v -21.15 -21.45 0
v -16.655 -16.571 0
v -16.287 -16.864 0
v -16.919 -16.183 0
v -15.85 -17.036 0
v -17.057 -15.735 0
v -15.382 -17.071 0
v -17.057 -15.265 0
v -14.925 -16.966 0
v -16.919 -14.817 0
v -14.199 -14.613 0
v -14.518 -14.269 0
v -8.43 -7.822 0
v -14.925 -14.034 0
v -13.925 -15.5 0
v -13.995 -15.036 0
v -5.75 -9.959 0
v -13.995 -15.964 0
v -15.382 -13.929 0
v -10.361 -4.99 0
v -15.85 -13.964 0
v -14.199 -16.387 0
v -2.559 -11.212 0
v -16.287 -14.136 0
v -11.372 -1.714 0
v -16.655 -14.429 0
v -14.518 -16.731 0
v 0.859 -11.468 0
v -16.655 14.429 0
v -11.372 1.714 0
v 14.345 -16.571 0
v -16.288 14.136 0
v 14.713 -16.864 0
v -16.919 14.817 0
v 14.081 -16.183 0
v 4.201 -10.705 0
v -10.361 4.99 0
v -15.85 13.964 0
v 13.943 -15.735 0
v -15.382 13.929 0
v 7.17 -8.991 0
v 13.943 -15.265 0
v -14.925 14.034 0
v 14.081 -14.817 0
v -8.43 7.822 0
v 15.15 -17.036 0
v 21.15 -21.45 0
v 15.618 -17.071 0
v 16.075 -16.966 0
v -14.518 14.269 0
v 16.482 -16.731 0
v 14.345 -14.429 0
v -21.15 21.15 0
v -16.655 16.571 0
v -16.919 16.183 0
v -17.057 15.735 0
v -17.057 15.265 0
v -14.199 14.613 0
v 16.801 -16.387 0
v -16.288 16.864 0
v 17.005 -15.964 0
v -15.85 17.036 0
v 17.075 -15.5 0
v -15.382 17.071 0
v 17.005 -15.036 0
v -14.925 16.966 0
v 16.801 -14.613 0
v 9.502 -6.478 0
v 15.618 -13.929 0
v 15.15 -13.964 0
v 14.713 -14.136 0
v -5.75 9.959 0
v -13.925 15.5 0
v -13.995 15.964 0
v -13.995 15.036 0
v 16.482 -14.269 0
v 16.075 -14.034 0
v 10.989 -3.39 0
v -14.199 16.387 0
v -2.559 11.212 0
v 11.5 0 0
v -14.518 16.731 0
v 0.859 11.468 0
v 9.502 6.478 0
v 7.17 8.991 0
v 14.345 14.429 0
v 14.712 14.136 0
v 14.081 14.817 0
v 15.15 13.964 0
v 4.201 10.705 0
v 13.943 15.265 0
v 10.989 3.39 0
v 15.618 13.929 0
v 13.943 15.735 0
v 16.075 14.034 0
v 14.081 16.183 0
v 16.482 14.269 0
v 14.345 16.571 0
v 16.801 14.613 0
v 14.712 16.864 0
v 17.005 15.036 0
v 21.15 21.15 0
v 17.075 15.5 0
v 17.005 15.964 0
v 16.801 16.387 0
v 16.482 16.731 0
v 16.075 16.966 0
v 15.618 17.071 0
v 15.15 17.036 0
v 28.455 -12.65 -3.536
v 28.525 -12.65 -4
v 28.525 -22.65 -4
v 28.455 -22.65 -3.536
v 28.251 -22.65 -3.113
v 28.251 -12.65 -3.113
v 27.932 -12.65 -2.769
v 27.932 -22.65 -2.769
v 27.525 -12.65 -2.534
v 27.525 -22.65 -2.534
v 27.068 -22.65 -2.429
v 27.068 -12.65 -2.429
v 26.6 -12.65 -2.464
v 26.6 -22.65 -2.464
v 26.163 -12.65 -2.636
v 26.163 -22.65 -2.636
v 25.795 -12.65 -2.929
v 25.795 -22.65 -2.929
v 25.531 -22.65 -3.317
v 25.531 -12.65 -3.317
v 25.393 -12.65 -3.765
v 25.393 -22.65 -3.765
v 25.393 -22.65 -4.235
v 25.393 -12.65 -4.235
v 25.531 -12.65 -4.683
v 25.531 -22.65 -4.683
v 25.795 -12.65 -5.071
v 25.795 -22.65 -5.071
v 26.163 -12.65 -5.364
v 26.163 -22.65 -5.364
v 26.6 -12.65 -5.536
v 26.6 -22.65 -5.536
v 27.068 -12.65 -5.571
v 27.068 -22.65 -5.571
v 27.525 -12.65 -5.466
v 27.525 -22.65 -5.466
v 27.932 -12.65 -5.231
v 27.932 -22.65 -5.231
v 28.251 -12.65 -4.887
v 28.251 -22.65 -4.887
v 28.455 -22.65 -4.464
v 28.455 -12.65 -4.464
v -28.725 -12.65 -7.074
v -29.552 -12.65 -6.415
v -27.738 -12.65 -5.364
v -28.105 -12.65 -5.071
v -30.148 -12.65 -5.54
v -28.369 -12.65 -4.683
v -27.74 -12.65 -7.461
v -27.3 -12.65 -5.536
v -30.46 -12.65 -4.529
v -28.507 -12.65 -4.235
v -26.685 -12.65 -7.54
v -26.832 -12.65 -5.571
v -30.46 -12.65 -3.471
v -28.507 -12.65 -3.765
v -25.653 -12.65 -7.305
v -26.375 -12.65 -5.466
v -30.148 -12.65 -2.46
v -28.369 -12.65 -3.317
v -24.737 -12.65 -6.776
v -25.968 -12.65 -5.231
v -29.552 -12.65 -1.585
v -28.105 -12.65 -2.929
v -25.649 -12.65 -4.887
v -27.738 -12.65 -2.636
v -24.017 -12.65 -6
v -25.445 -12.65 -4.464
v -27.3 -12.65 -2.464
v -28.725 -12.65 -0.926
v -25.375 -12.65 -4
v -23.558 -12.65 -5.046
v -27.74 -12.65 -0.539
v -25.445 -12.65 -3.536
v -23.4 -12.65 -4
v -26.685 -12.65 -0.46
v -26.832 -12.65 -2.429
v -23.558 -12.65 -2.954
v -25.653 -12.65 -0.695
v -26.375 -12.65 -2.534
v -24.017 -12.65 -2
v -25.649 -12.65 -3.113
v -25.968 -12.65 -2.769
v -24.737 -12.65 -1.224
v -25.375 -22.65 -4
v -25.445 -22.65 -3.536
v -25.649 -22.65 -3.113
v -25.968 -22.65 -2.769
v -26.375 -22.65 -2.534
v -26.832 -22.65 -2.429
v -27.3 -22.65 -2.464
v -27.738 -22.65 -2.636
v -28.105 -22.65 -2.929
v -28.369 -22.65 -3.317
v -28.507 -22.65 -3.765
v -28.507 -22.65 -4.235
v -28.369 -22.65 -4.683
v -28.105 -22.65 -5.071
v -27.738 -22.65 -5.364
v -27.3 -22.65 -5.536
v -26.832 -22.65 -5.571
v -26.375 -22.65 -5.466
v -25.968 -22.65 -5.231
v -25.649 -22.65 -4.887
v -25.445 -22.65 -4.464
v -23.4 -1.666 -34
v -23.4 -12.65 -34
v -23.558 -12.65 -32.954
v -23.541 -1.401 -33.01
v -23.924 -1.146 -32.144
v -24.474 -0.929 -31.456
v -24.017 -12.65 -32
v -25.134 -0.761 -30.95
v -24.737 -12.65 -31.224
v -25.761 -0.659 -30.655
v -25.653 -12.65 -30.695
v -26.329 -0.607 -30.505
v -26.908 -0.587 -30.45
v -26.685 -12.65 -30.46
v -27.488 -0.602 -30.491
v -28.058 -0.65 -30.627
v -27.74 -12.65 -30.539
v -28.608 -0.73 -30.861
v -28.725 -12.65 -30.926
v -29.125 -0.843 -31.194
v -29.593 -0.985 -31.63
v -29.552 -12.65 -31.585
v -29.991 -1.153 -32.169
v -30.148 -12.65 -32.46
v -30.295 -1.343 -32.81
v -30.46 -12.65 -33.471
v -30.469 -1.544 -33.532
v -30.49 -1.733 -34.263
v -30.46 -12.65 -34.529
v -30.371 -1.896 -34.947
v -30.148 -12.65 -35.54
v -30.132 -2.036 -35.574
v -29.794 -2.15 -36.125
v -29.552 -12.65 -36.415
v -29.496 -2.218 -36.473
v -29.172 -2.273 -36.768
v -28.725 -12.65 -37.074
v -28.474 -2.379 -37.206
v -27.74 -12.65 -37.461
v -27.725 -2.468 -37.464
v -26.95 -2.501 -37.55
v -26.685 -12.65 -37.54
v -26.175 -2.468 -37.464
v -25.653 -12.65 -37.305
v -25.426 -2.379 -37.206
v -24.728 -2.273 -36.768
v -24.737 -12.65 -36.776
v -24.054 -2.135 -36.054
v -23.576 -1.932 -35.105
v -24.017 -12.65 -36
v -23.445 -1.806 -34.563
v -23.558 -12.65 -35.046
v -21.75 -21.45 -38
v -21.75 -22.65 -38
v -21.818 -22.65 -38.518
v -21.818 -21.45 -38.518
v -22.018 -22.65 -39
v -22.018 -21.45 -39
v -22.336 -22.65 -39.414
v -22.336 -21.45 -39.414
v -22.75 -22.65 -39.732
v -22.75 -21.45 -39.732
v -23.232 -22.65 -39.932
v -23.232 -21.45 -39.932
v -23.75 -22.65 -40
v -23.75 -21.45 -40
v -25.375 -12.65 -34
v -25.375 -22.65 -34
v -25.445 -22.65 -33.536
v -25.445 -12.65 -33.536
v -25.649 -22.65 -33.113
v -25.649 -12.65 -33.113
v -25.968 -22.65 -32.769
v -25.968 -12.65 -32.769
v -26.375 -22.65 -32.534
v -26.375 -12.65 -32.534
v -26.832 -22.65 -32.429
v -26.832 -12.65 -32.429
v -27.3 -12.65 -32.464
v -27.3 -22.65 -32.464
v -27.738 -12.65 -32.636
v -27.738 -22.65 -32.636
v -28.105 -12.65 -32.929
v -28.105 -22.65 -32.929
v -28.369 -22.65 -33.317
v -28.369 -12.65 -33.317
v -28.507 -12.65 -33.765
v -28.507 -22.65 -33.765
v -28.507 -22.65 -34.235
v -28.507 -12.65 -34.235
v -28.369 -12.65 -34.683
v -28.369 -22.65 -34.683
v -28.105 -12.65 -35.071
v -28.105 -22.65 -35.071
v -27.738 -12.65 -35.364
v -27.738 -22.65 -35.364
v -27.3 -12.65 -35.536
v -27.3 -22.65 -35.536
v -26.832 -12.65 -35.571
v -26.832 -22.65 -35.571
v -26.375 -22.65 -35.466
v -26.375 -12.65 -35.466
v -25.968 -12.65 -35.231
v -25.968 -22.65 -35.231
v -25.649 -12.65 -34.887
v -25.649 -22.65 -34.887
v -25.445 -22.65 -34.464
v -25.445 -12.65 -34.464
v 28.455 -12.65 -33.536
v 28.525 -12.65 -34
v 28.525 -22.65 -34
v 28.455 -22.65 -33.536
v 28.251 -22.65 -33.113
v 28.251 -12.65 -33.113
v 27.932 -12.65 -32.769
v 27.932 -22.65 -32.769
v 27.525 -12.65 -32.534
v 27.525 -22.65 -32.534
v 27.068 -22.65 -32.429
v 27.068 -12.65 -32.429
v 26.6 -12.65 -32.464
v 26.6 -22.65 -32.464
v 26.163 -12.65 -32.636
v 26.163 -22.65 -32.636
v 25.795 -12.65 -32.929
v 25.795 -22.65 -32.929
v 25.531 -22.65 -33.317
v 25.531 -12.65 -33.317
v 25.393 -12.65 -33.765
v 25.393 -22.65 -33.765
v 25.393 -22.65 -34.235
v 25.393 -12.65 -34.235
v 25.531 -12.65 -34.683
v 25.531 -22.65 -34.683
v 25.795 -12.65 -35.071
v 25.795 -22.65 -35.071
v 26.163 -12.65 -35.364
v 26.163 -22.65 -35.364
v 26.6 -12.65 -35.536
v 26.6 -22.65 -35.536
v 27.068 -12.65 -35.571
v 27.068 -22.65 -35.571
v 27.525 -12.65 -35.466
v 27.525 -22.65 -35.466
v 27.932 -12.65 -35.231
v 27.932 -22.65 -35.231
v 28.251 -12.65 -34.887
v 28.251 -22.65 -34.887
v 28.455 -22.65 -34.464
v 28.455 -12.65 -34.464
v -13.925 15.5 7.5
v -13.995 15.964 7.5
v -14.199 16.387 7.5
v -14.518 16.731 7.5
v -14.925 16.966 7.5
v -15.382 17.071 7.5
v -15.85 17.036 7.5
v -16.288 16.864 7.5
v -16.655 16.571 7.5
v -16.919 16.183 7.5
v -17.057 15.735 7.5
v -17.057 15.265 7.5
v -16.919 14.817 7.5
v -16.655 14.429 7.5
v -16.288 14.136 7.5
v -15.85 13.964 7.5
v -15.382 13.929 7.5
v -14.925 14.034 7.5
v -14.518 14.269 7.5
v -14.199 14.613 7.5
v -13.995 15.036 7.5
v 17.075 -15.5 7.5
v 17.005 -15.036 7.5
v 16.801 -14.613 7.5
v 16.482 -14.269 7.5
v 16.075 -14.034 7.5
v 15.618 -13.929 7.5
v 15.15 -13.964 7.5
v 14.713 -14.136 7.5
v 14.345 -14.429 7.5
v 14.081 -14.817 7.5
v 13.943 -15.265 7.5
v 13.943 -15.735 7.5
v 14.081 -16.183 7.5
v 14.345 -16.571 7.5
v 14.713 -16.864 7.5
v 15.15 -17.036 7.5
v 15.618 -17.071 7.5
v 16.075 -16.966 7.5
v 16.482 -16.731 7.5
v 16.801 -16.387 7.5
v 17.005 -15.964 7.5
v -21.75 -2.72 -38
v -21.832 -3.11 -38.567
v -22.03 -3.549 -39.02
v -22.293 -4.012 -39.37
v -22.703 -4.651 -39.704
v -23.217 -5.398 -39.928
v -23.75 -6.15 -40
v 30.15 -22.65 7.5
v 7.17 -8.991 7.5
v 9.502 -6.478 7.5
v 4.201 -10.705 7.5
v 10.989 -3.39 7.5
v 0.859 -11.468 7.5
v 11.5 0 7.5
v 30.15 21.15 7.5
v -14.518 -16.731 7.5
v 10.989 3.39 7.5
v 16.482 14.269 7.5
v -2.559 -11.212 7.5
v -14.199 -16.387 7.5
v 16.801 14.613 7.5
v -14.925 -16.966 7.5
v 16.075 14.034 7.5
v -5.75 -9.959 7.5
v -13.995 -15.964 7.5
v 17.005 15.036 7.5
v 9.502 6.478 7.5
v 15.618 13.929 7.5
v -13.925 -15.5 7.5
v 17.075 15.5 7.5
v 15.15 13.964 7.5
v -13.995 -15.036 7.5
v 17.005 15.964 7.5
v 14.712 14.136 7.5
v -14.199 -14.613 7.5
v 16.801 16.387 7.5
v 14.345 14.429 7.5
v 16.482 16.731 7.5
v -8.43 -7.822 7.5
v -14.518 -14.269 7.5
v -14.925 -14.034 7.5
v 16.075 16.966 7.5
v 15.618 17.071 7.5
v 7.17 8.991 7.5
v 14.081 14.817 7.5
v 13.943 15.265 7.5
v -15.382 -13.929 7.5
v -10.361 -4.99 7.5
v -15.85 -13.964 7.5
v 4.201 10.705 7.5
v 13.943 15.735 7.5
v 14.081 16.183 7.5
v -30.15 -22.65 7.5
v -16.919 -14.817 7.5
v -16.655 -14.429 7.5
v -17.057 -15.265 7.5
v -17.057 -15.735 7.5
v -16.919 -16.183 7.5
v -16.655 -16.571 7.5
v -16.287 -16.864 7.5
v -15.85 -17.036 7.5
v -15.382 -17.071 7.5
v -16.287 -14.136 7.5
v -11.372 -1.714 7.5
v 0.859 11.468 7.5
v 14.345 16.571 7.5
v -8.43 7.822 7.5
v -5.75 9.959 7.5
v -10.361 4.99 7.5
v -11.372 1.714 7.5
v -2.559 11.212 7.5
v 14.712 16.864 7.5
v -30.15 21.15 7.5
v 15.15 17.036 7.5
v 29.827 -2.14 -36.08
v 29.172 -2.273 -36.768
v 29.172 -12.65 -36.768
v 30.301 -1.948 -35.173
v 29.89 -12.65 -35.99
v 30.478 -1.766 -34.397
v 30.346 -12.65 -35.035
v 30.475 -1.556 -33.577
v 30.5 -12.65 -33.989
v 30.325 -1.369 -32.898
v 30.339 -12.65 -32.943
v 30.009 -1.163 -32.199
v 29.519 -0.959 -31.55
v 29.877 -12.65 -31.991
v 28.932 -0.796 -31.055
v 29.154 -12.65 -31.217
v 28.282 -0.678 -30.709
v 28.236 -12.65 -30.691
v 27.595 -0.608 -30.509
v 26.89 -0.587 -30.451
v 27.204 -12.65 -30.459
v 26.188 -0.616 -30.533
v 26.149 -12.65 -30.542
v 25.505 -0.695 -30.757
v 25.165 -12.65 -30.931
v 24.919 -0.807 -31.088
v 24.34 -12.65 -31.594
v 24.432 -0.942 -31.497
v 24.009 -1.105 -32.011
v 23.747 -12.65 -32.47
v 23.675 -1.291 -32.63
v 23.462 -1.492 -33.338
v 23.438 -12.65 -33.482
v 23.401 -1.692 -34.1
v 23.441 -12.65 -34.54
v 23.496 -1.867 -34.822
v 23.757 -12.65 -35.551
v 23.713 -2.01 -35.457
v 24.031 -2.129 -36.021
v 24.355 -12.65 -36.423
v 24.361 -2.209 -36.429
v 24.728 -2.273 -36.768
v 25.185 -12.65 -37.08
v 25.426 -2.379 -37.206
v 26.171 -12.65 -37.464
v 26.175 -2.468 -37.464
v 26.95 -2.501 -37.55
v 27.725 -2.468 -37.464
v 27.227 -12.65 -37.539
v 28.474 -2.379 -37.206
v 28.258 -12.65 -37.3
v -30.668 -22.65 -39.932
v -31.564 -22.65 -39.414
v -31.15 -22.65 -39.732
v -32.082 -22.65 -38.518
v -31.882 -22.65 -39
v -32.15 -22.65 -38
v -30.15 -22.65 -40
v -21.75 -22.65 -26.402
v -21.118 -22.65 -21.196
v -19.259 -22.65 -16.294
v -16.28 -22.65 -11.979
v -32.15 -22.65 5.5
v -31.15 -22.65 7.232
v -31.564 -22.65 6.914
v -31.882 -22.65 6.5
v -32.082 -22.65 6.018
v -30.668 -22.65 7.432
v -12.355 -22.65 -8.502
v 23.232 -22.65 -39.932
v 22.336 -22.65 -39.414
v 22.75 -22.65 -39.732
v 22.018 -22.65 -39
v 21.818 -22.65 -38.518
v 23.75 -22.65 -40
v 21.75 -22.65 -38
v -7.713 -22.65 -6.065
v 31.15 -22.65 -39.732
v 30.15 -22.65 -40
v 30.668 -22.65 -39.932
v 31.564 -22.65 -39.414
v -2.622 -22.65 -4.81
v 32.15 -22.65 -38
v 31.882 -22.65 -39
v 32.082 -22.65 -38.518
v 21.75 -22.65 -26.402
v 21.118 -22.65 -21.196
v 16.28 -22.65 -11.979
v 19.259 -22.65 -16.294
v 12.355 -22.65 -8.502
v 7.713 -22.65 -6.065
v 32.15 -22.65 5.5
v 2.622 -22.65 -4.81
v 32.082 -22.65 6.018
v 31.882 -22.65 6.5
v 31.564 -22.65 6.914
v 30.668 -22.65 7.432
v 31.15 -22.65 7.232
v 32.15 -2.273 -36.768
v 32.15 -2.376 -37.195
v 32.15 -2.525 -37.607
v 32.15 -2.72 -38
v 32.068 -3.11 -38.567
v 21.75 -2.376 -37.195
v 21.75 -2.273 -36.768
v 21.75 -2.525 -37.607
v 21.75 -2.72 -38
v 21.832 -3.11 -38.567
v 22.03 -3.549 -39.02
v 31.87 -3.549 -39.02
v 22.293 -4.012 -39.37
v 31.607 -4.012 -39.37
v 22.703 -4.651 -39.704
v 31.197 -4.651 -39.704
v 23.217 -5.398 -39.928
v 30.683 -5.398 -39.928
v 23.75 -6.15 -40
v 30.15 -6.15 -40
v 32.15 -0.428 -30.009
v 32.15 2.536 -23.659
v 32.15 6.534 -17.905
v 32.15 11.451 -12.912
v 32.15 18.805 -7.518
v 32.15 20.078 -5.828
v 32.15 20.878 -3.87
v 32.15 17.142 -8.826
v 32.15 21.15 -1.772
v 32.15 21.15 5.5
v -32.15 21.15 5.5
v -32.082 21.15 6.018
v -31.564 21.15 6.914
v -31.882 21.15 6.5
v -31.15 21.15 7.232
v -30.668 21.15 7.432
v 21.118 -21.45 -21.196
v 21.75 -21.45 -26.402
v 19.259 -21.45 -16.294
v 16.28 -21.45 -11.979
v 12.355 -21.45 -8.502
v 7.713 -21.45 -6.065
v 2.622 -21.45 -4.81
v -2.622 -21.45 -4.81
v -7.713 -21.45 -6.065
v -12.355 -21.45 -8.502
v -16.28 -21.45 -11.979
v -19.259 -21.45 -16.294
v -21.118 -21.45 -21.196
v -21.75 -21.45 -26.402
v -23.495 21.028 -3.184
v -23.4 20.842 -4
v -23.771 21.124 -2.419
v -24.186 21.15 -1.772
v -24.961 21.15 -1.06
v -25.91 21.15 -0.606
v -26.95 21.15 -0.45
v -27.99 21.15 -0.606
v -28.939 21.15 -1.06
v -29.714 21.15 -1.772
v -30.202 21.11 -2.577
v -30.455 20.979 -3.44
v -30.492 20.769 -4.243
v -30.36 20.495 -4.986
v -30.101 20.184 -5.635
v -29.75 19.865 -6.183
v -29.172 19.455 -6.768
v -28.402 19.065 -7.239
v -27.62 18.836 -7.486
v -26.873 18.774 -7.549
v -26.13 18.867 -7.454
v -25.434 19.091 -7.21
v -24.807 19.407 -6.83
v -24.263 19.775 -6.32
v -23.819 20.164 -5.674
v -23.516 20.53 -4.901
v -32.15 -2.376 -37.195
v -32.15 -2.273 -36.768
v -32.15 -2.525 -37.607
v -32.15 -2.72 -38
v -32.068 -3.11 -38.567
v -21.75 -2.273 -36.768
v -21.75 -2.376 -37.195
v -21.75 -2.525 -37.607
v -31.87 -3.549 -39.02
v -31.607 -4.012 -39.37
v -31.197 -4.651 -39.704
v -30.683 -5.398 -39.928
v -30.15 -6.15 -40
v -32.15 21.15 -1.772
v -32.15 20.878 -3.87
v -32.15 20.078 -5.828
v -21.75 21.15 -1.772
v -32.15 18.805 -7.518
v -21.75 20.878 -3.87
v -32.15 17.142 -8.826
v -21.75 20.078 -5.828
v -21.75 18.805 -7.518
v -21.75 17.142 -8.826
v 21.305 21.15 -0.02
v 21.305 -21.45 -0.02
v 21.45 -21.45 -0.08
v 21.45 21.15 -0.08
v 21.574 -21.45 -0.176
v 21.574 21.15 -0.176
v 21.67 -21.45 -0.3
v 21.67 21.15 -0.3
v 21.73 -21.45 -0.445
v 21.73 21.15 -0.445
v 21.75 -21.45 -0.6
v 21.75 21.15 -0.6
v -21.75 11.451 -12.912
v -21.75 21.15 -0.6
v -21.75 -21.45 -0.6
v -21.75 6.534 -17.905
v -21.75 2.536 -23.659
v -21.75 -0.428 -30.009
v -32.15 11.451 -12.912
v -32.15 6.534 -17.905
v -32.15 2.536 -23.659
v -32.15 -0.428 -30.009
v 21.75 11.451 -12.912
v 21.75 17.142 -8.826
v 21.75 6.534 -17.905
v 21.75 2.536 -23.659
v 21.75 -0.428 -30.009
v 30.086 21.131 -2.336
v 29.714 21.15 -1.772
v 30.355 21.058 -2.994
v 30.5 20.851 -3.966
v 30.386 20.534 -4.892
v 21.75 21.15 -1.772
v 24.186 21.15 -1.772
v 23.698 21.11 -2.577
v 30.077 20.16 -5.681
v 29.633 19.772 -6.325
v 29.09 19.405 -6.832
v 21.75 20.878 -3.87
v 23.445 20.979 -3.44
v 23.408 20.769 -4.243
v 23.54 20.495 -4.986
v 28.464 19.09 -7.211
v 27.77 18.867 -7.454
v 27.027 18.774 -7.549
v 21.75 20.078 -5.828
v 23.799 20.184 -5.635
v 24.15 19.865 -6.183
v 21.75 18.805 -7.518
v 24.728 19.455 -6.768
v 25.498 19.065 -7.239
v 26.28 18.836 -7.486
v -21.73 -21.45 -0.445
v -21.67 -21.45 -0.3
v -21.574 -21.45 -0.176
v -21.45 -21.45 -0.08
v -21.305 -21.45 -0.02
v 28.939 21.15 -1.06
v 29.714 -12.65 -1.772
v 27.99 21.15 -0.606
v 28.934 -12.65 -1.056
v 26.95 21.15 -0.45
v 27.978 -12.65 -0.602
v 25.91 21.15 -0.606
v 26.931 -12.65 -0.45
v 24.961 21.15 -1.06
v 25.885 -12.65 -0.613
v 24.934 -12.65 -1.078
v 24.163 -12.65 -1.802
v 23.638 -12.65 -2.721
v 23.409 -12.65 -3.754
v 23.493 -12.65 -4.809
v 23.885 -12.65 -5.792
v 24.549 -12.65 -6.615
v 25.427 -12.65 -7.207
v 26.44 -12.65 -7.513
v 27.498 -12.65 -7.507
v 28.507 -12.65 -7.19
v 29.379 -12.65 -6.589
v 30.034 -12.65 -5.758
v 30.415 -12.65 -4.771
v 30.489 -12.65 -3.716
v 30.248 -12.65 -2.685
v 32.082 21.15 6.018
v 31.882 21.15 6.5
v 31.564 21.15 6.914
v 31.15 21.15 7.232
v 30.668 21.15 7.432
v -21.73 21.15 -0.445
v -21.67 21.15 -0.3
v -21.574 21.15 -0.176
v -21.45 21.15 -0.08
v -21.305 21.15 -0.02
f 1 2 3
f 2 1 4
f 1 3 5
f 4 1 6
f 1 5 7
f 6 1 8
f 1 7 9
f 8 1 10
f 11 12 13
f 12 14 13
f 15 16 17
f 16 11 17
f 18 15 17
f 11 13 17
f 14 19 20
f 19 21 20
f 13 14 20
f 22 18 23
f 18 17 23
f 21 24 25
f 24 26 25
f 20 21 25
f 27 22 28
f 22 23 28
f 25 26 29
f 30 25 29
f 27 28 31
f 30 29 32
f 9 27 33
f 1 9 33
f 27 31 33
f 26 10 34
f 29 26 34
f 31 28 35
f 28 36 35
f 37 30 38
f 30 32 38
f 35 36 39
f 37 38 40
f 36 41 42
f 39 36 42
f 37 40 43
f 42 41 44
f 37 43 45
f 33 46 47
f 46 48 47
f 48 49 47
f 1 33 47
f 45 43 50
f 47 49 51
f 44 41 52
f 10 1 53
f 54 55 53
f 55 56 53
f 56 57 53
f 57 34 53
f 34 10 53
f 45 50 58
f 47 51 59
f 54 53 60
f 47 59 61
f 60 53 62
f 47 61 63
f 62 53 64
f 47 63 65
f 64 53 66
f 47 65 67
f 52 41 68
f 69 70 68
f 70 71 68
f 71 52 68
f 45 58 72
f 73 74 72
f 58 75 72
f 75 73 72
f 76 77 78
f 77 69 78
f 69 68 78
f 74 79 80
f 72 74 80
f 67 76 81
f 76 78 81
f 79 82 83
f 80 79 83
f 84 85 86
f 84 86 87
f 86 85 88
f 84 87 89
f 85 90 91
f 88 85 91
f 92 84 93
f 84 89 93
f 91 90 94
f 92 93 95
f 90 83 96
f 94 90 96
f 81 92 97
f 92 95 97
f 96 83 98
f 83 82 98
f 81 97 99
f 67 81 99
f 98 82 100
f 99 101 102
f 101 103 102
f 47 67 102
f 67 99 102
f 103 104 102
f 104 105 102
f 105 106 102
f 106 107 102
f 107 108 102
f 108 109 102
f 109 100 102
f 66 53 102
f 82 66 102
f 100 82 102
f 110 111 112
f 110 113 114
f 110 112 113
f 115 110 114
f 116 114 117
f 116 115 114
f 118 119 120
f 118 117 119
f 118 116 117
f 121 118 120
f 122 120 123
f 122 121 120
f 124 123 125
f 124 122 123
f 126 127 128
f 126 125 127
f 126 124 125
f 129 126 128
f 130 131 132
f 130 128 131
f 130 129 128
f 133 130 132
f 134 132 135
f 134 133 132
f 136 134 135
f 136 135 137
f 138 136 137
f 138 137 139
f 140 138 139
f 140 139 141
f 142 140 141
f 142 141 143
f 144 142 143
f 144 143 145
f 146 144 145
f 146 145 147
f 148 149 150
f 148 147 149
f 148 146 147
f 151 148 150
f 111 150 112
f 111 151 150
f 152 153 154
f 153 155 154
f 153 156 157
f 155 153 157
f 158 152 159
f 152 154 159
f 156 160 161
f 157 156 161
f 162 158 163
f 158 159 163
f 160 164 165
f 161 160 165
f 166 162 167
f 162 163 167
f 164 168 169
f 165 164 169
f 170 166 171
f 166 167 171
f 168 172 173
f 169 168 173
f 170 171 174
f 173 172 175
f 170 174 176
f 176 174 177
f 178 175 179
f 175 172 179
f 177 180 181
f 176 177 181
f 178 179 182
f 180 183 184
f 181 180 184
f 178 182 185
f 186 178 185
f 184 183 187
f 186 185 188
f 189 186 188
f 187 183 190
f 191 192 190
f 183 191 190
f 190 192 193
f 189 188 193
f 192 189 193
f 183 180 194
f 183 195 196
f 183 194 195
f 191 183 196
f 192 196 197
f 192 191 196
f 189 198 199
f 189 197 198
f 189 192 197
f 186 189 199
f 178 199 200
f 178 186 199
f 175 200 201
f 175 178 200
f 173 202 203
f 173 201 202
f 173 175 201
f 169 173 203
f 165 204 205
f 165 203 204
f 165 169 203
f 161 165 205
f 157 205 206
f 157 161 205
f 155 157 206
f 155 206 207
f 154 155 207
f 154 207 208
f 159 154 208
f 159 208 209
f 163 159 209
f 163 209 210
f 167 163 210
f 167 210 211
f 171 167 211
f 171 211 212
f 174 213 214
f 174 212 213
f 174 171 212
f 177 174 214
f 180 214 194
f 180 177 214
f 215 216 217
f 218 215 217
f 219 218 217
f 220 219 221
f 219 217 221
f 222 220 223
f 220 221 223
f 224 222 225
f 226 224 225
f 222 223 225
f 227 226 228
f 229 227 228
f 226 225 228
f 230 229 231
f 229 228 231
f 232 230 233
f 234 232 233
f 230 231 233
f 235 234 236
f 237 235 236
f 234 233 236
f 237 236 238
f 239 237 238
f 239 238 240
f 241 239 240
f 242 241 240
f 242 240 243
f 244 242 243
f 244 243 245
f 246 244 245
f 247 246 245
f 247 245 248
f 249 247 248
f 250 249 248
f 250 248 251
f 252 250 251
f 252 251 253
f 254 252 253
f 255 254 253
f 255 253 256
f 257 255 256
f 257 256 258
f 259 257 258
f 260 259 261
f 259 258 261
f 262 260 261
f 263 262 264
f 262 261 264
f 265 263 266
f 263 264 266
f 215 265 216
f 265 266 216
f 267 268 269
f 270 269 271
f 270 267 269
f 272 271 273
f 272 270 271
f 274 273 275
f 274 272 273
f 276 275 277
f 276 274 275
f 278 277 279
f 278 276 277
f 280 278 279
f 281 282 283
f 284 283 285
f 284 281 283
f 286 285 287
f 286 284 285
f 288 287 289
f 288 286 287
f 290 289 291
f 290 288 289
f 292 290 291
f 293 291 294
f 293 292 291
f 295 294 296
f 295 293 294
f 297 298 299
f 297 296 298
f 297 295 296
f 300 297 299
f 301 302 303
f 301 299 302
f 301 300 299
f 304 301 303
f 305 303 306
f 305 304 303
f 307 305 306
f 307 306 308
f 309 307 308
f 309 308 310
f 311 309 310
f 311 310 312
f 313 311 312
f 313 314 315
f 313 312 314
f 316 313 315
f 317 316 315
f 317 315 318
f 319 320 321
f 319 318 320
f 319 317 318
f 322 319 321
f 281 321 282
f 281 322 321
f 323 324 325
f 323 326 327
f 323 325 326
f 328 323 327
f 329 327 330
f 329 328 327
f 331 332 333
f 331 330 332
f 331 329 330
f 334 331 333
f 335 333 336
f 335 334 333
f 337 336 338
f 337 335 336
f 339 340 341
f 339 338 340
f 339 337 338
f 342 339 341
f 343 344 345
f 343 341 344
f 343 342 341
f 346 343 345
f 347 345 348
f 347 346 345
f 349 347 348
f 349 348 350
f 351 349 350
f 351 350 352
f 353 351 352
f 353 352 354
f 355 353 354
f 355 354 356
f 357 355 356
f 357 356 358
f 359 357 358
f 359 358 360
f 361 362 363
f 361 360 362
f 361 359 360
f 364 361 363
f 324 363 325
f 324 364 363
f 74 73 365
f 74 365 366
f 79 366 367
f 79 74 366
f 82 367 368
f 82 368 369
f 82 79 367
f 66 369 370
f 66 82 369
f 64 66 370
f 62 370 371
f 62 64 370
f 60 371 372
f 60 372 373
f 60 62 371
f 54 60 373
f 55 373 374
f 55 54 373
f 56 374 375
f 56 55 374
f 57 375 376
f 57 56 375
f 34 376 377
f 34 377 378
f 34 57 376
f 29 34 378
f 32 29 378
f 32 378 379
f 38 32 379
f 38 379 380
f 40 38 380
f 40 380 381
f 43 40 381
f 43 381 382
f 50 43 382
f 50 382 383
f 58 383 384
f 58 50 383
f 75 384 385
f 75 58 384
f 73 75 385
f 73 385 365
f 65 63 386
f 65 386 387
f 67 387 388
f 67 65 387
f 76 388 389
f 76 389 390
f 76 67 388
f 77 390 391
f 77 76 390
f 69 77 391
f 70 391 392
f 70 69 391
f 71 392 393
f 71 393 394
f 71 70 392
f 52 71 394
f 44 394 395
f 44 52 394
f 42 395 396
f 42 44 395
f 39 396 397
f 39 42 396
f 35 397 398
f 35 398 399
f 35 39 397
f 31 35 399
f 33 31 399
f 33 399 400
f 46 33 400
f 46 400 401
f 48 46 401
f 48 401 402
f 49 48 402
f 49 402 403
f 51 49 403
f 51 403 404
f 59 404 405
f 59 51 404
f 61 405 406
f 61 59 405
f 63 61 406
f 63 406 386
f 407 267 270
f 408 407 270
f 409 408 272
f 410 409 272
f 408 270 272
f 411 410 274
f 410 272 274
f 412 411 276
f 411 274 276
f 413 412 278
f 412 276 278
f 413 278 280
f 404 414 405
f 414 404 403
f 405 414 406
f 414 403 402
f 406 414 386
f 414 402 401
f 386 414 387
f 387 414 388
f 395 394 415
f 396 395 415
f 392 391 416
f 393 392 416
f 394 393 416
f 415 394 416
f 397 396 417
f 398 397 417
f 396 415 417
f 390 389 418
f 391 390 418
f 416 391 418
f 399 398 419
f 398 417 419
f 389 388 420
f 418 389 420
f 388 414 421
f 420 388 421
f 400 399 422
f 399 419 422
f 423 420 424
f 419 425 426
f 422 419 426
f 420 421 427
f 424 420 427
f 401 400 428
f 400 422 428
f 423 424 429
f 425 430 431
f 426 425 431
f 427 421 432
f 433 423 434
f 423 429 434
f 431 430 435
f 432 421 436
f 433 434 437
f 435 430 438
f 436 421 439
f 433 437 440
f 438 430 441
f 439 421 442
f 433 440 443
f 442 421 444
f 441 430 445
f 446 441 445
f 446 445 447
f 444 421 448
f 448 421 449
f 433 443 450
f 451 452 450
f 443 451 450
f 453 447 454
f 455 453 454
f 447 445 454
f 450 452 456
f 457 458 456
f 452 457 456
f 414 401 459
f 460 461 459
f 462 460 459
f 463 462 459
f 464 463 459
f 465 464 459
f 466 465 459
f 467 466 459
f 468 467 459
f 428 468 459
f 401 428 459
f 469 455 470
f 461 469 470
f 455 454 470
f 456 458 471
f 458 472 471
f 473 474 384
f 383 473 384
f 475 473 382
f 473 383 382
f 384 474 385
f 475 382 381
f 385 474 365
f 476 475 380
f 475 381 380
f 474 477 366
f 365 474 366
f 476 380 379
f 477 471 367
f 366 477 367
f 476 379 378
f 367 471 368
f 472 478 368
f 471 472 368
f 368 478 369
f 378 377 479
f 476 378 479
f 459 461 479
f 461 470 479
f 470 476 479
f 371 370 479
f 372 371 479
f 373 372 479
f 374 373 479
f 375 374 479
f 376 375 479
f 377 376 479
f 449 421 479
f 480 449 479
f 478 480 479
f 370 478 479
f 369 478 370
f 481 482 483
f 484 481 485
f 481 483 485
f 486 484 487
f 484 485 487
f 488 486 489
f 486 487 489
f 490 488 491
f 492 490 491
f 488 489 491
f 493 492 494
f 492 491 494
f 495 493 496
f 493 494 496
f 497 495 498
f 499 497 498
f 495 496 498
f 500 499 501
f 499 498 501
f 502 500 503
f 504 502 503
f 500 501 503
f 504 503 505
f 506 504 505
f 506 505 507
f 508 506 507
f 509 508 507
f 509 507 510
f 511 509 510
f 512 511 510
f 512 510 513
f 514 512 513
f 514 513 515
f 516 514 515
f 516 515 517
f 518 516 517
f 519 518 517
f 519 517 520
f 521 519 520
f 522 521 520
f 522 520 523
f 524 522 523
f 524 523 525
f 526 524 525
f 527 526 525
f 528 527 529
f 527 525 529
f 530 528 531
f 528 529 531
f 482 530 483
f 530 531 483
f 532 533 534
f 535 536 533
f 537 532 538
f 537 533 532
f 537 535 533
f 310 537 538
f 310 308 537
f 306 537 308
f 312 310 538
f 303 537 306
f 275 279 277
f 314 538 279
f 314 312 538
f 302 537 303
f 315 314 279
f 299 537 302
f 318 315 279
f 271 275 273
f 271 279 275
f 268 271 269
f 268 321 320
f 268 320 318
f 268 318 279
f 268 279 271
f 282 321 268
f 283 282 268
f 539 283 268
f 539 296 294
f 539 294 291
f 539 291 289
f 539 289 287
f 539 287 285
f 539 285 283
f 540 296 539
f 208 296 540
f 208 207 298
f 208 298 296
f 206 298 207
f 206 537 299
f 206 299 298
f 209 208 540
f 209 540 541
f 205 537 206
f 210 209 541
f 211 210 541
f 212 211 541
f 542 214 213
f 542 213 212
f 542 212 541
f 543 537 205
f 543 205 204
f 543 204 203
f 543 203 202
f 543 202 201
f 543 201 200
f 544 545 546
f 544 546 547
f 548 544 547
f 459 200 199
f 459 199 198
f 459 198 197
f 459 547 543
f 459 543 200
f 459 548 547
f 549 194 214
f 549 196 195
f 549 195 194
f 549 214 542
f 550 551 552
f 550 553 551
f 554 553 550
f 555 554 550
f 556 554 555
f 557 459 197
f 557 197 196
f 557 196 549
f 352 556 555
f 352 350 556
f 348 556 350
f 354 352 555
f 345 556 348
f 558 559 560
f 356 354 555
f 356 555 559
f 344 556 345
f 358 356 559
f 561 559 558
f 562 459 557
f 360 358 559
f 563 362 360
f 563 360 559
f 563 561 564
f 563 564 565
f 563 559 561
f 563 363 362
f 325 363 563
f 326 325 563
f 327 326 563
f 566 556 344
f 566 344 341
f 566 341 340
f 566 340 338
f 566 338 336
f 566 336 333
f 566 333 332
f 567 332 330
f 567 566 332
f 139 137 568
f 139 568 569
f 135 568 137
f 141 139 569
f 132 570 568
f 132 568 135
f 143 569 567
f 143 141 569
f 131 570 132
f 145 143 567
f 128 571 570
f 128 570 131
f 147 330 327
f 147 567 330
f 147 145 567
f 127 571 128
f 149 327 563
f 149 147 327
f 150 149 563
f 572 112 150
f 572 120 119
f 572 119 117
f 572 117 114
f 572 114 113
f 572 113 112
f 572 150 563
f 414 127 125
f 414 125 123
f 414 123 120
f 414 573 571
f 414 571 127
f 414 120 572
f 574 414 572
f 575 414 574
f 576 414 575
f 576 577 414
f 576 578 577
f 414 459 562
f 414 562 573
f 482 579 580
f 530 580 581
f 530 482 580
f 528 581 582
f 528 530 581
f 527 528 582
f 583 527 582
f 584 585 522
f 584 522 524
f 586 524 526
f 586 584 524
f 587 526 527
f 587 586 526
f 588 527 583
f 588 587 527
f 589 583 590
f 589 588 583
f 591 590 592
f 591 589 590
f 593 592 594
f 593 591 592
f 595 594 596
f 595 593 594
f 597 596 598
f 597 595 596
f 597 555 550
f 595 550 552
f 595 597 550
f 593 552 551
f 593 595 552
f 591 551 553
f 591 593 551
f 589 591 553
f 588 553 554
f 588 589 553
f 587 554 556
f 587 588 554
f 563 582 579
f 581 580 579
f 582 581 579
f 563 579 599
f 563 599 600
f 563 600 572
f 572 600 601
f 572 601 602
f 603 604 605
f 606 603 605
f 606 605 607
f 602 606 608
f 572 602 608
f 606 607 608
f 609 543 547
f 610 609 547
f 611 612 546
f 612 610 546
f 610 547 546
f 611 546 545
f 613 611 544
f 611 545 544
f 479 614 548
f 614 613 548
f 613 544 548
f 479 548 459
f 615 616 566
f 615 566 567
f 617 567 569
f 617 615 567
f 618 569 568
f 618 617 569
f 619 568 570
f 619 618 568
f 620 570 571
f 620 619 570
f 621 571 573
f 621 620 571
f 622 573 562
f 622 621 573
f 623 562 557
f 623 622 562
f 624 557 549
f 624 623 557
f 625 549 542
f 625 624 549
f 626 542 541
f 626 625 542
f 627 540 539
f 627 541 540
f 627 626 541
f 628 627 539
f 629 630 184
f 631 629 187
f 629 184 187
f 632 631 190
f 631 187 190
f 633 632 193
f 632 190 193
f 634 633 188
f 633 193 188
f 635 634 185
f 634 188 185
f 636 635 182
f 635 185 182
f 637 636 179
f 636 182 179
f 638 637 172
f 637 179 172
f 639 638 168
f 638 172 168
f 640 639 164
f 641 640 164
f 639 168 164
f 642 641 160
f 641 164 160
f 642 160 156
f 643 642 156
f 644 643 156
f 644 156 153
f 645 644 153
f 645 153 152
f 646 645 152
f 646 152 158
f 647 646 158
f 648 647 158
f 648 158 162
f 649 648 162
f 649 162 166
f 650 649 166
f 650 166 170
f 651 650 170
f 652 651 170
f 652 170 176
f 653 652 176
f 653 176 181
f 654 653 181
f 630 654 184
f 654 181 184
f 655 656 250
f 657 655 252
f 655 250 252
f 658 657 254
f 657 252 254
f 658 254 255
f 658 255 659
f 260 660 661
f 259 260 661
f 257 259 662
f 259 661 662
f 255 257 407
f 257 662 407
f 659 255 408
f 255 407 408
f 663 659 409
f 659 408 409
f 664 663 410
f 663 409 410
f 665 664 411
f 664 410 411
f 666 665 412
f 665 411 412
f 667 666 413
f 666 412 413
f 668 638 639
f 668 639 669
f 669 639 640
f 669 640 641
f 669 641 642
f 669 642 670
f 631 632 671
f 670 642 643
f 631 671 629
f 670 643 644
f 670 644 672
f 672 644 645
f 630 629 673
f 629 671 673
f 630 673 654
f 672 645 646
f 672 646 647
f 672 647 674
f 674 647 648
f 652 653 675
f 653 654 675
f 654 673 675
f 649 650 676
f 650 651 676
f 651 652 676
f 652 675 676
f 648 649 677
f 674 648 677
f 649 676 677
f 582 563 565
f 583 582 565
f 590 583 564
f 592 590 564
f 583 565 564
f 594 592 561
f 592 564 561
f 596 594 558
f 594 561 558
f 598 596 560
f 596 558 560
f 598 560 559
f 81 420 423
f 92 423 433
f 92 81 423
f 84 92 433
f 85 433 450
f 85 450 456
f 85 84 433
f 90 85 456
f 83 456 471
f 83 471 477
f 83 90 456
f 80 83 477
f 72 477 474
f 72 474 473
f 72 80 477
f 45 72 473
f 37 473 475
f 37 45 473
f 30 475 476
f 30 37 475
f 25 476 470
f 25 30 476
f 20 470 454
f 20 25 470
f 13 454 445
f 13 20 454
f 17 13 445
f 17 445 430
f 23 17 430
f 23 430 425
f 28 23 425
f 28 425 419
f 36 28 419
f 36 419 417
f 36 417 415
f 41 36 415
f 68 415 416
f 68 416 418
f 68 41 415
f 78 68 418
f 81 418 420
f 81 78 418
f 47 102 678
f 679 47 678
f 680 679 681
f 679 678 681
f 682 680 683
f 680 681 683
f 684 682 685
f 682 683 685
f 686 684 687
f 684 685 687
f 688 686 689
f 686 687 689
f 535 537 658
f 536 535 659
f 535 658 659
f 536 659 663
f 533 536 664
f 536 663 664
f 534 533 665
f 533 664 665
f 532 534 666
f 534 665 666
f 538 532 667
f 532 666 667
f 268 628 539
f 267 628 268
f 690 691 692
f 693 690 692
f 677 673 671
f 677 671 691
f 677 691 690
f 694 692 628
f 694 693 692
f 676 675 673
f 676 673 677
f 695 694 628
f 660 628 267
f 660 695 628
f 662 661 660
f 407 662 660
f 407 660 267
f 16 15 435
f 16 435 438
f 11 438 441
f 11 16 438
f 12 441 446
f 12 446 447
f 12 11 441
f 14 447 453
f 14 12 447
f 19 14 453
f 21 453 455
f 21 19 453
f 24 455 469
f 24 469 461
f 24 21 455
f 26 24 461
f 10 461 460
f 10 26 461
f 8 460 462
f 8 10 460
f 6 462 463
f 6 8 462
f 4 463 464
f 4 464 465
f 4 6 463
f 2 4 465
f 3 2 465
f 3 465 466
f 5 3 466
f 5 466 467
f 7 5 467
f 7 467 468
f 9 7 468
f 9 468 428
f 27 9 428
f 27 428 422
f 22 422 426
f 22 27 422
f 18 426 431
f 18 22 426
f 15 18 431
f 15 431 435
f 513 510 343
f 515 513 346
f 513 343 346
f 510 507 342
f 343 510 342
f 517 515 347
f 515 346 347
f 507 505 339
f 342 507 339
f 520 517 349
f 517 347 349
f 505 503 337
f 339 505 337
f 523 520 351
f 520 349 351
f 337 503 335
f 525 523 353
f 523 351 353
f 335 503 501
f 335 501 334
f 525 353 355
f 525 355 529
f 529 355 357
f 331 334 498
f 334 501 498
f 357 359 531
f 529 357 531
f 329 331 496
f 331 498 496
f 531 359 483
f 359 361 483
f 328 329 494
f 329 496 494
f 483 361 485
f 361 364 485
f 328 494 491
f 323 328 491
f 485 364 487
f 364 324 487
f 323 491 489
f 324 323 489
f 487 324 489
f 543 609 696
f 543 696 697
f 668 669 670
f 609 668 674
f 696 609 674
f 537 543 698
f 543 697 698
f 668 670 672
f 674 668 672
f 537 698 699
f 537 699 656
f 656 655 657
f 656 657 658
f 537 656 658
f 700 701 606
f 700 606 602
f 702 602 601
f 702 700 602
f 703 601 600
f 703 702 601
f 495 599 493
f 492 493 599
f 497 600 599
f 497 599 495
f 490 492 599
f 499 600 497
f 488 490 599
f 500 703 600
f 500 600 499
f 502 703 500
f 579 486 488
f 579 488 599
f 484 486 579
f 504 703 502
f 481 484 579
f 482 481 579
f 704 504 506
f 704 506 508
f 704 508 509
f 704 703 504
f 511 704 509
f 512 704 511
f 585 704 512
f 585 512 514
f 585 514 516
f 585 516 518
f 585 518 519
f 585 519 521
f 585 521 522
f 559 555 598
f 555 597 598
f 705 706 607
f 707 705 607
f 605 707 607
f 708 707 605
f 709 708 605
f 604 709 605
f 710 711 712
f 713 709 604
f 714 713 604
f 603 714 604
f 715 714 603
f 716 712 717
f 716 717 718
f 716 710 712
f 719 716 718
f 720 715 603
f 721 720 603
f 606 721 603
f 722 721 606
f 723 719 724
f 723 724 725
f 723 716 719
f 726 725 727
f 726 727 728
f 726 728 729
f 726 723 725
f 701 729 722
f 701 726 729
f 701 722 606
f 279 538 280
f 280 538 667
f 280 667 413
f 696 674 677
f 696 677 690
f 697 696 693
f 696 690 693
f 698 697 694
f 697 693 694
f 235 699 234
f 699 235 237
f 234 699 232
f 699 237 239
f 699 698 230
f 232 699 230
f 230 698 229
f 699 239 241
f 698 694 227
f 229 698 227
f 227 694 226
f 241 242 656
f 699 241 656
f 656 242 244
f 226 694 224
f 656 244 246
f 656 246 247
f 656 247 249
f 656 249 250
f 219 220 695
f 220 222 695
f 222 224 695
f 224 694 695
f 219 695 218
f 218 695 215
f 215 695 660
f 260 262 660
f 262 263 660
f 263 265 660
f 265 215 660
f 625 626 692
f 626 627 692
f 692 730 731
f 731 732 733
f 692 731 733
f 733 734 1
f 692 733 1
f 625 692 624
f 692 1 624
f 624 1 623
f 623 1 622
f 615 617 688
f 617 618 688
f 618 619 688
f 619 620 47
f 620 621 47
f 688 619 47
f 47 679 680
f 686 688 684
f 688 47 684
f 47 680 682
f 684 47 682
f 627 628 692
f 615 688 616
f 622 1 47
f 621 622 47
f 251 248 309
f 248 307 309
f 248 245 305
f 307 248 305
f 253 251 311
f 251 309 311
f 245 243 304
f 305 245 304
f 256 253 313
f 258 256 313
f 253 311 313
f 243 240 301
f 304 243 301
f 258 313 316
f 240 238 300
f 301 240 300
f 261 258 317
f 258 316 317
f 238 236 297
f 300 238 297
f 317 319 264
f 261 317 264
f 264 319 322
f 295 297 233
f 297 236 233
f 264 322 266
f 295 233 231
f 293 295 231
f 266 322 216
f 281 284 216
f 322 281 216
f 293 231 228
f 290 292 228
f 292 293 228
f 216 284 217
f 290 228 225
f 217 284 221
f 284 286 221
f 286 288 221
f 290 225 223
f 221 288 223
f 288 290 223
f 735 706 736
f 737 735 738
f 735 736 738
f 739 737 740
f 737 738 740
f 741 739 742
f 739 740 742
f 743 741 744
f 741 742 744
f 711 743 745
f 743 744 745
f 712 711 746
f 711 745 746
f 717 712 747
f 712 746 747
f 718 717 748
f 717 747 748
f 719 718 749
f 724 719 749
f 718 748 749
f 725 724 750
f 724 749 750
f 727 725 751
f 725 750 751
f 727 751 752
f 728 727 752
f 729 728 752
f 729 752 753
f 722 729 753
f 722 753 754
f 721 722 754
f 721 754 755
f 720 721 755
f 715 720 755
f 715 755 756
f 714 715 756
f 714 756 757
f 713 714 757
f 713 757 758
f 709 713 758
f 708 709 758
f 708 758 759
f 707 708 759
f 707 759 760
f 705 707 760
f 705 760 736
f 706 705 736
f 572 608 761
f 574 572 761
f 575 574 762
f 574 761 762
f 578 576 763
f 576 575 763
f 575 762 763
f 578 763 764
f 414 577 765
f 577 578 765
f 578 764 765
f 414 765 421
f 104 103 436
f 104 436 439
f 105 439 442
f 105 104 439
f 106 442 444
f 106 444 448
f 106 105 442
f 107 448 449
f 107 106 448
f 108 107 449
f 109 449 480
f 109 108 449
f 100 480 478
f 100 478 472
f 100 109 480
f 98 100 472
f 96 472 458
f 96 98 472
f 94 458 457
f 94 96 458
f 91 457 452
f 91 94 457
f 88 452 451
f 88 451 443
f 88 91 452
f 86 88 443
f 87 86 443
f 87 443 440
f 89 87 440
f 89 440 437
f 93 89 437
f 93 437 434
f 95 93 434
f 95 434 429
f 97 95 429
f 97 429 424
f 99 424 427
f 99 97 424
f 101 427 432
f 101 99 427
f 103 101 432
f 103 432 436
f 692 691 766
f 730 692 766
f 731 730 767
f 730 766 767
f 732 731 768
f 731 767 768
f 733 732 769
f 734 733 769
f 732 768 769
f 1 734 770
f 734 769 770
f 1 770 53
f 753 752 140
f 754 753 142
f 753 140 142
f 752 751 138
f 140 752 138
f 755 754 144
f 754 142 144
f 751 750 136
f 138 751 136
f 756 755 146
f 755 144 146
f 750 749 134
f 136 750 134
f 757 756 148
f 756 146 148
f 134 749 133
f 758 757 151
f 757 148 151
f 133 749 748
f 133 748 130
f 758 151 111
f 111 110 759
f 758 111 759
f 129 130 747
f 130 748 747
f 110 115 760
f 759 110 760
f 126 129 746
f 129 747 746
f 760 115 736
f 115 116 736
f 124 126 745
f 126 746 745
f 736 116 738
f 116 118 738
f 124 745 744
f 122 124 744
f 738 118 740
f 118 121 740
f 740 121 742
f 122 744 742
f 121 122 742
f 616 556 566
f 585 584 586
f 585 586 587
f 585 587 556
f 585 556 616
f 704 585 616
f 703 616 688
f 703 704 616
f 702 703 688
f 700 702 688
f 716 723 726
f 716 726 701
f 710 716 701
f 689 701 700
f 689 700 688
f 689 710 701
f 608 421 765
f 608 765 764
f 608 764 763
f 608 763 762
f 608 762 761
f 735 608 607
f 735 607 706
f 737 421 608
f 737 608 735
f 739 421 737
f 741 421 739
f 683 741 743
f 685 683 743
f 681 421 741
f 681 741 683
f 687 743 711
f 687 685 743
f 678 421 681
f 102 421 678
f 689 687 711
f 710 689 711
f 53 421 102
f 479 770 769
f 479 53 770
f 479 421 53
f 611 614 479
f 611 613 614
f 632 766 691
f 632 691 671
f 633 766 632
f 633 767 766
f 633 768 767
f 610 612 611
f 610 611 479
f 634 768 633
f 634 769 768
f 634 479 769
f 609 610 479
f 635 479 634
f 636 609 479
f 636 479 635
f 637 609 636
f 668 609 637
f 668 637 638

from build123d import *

# Parameters (mm, degrees)
MAIN_FACE_R                    = 1.5749999999999995
MAIN_FACE_R_2                  = 1.5750000000000013
MAIN_FACE_R_3                  = 11.5
MAINFACE_DEPTH                 = 7.5
SKETCH2_W                      = 7.500000000000001
SKETCH2_H                      = 42.30000000000015
SIDEPROFILE_DEPTH              = 11
NON_INTERFERING_FILLET_DEPTH   = 67.5049810164623
BASECLEARANCE_DEPTH            = 1.5
GROUDINGBOLTHOLES_DEPTH        = 68.46897435117894
GROUDINGBOLTHOLES_DEPTH_BACK   = 68.46897435117894
SKETCH5_R                      = 1.5749999999999995
BOLTACCESSHOLES_START          = -10
SKETCH5_3_R                    = 3.55
SKETCH5_3_R_2                  = 1.5749999999999995
SKETCH5_3_R_3                  = 3.5500000000000007
BOLTACCESSHOLES_DEPTH          = 47.50000000000001
HAPPYPRINTERCURVES_R           = 2
SKETCH6_W                      = 48.78690945060761
SKETCH6_H                      = 41.74981882727384
BASEPLATE_DEPTH                = 1.2
SUPPORTTORSIONBUTBREATHE_DEPTH = 67.6961957157231


with BuildPart() as part:
    # Main Face → MainFace (new body)
    with BuildSketch(Plane.XY):
        Polygon((0, 21.150000000000077), (21.150000000000077, 21.150000000000077), (21.150000000000087, 7.98e-14), (21.150000000000507, -21.149999999999572), (8.381e-14, -21.149999999999928), (-21.149999999999924, -21.149999999999928), (-21.149999999999995, -2.69e-15), (-21.149999999999856, 21.150000000000222), align=None)
        with Locations((15.499999999999996, 15.5)):
            Circle(MAIN_FACE_R, mode=Mode.SUBTRACT)
        with Locations((15.500000000000005, -15.500000000000002)):
            Circle(MAIN_FACE_R_2, mode=Mode.SUBTRACT)
        with Locations((-15.499999999999998, -15.500000000000012)):
            Circle(MAIN_FACE_R, mode=Mode.SUBTRACT)
        with Locations((-15.50000000000001, 15.49999999999999)):
            Circle(MAIN_FACE_R, mode=Mode.SUBTRACT)
        Circle(MAIN_FACE_R_3, mode=Mode.SUBTRACT)
    extrude(amount=MAINFACE_DEPTH)

    # Sketch2 → SideProfile (add)
    with BuildSketch(Plane.ZY.offset(21.149999999999995)):
        with Locations((3.7500000000000004, 2.1849e-13)):
            Rectangle(SKETCH2_W, SKETCH2_H)
        with BuildLine():
            Line((0, -21.14999999999986), (0, 21.150000000000293))
            Line((0, 21.150000000000293), (-1.771709500841494, 21.150000000000293))
            ThreePointArc((-1.7717095008414934, 21.150000000000297), (-5.828166751938932, 20.078151362319375), (-8.825687949345335, 17.14241097816094))
            ThreePointArc((-8.82568794934533, 17.142410978160935), (-20.697100679367818, 4.412586379453849), (-36.76838475660053, -2.2726737223876654))
            ThreePointArc((-36.76838475660055, -2.2726737223876654), (-39.086170348891756, -3.6262628829235943), (-40, -6.149999999999864))
            Line((-40, -6.149999999999864), (-40, -21.149999999999864))
            Line((-40, -21.149999999999864), (0, -21.149999999999856))
        make_face()
    sideprofile = extrude(amount=SIDEPROFILE_DEPTH)

    # Sketch3 → Non-interfering fillet (cut, symmetric)
    with BuildSketch(Plane(origin=(0, 21.150000000000077, 0), x_dir=(1, 0, 0), z_dir=(0, 1, 0))):
        with BuildLine():
            Line((-21.75000000000007, 0.5999999999999999), (-21.750000000000068, 41.938133152744264))
            Line((-21.750000000000068, 41.938133152744264), (-16.932175207311897, 41.938133152744264))
            Line((-16.932175207311897, 41.938133152744264), (-16.932175207311897, 2.9783080433489855))
            Line((-16.932175207311897, 2.9783080433489855), (-21.149999999999856, 0))
            ThreePointArc((-21.149999999999856, 0), (-21.574264068711923, 0.17573593128799603), (-21.75000000000007, 0.5999999999999999))
        make_face()
    non_interfering_fillet = extrude(amount=NON_INTERFERING_FILLET_DEPTH, both=True, mode=Mode.SUBTRACT)

    # Mirror1: SideProfile, Non-interfering fillet across plane
    add(sideprofile.mirror(Plane(origin=(0, 0, 0), x_dir=(0, 0, 1), z_dir=(1, 0, 0))))
    add(non_interfering_fillet.mirror(Plane(origin=(0, 0, 0), x_dir=(0, 0, 1), z_dir=(1, 0, 0))), mode=Mode.SUBTRACT)

    # Sketch4 → BaseClearance (add)
    with BuildSketch(Plane.XZ.offset(21.149999999999928)):
        with BuildLine():
            Line((21.749999999999716, -0.5999999999999999), (21.749999999999712, -39.99999999999999))
            Line((21.749999999999712, -39.99999999999999), (32.149999999999565, -40))
            Line((32.149999999999565, -40), (32.149999999999565, 7.5))
            Line((32.149999999999565, 7.5), (-32.150000000000276, 7.5))
            Line((-32.150000000000276, 7.5), (-32.150000000000276, -40))
            Line((-32.150000000000276, -40), (-21.750000000000433, -40))
            Line((-21.750000000000433, -40), (-21.75000000000043, -0.5999999999999998))
            ThreePointArc((-21.75000000000043, -0.5999999999999998), (-21.574264068712278, -0.17573593128799736), (-21.150000000000215, 0))
            Line((-21.150000000000215, 0), (21.149999999999498, 1.73e-15))
            ThreePointArc((21.149999999999498, 1.73e-15), (21.574264068711567, -0.17573593128799248), (21.749999999999716, -0.5999999999999999))
        make_face()
    extrude(amount=BASECLEARANCE_DEPTH)

    # Sketch5 → GroudingBoltHoles (cut, two sides: drawn at the far end of the back side and taken through both)
    with BuildSketch(Plane.XZ.offset(22.64999999999993).offset(-GROUDINGBOLTHOLES_DEPTH_BACK)):
        with Locations((-26.95000000000035, -4.0000000000000036)):
            Circle(SKETCH5_R)
        with Locations((-26.950000000000344, -34)):
            Circle(SKETCH5_R)
        with Locations((26.95000000000035, -33.99999999999999)):
            Circle(SKETCH5_R)
        with Locations((26.95000000000035, -3.9999999999999964)):
            Circle(SKETCH5_R)
    extrude(amount=GROUDINGBOLTHOLES_DEPTH + GROUDINGBOLTHOLES_DEPTH_BACK, mode=Mode.SUBTRACT)

    # Sketch5<3> → BoltAccessHoles (cut)
    # profile 1 of 4: a face of its own
    with BuildSketch(Plane.XZ.offset(22.64999999999993).offset(BOLTACCESSHOLES_START)):
        with Locations((-26.950000000000344, -34)):
            Circle(SKETCH5_3_R)
        with Locations((-26.950000000000344, -34)):
            Circle(SKETCH5_3_R_2, mode=Mode.SUBTRACT)
    # profile 2 of 4: a face of its own
    with BuildSketch(Plane.XZ.offset(22.64999999999993).offset(BOLTACCESSHOLES_START)):
        with Locations((-26.95000000000035, -4.0000000000000036)):
            Circle(SKETCH5_3_R_3)
    # profile 3 of 4: a face of its own
    with BuildSketch(Plane.XZ.offset(22.64999999999993).offset(BOLTACCESSHOLES_START)):
        with Locations(Location((26.95000000000035, -3.9999999999999964, 0), (0, 0, 38.879713196))):
            Circle(SKETCH5_3_R_3)
    # profile 4 of 4: a face of its own
    with BuildSketch(Plane.XZ.offset(22.64999999999993).offset(BOLTACCESSHOLES_START)):
        with Locations(Location((26.95000000000035, -33.99999999999999, 0), (0, 0, 308.755289776))):
            Circle(SKETCH5_3_R)
    extrude(amount=-BOLTACCESSHOLES_DEPTH, mode=Mode.SUBTRACT)

    # HappyPrinterCurves
    # the kernel refuses this fillet: 2 mm, written as the material it takes off along each edge
    with BuildSketch(Plane(origin=(32.1499999999999, -27.649999999999395, -40), x_dir=(0, 0, 1), z_dir=(1.29e-15, 1, 0))) as happyprintercurves_piece_1:
        with BuildLine():
            CenterArc((HAPPYPRINTERCURVES_R, -HAPPYPRINTERCURVES_R), HAPPYPRINTERCURVES_R, 90, 90)
            Line((0, -HAPPYPRINTERCURVES_R), (0, 0))
            Line((0, 0), (HAPPYPRINTERCURVES_R, 0))
        make_face()
    extrude(amount=26.49999999999942, mode=Mode.SUBTRACT)
    with BuildSketch(Plane(origin=(21.750000000000068, -1.1499999999999382, -40), x_dir=(0, 4.3e-16, 1), z_dir=(1.72e-15, -1, 4.3e-16))) as happyprintercurves_piece_2:
        with BuildLine():
            CenterArc((HAPPYPRINTERCURVES_R, -HAPPYPRINTERCURVES_R), HAPPYPRINTERCURVES_R, 90, 90)
            Line((0, -HAPPYPRINTERCURVES_R), (0, 0))
            Line((0, 0), (HAPPYPRINTERCURVES_R, 0))
        make_face()
    extrude(amount=26.49999999999963, mode=Mode.SUBTRACT)
    with BuildSketch(Plane(origin=(-32.149999999999984, -1.1499999999999737, -40), x_dir=(0, 0, 1), z_dir=(4.74e-15, -1, 0))) as happyprintercurves_piece_3:
        with BuildLine():
            CenterArc((HAPPYPRINTERCURVES_R, -HAPPYPRINTERCURVES_R), HAPPYPRINTERCURVES_R, 90, 90)
            Line((0, -HAPPYPRINTERCURVES_R), (0, 0))
            Line((0, 0), (HAPPYPRINTERCURVES_R, 0))
        make_face()
    extrude(amount=26.500000000000487, mode=Mode.SUBTRACT)
    with BuildSketch(Plane(origin=(-32.1499999999999, -27.65000000000046, 7.5), x_dir=(1, 3.89e-15, 0), z_dir=(-3.89e-15, 1, 0))) as happyprintercurves_piece_4:
        with BuildLine():
            CenterArc((HAPPYPRINTERCURVES_R, HAPPYPRINTERCURVES_R), HAPPYPRINTERCURVES_R, 180, 90)
            Line((0, HAPPYPRINTERCURVES_R), (0, 0))
            Line((0, 0), (HAPPYPRINTERCURVES_R, 0))
        make_face()
    extrude(amount=53.800000000000644, mode=Mode.SUBTRACT)
    with BuildSketch(Plane(origin=(-21.750000000000068, -27.65000000000029, -40), x_dir=(0, 0, 1), z_dir=(-1.08e-15, 1, 0))) as happyprintercurves_piece_5:
        with BuildLine():
            CenterArc((HAPPYPRINTERCURVES_R, -HAPPYPRINTERCURVES_R), HAPPYPRINTERCURVES_R, 90, 90)
            Line((0, -HAPPYPRINTERCURVES_R), (0, 0))
            Line((0, 0), (HAPPYPRINTERCURVES_R, 0))
        make_face()
    extrude(amount=26.500000000000348, mode=Mode.SUBTRACT)
    with BuildSketch(Plane(origin=(32.150000000000084, 26.150000000000183, 7.5), x_dir=(0, 0, -1), z_dir=(-2.6e-15, -1, 0))) as happyprintercurves_piece_6:
        with BuildLine():
            CenterArc((HAPPYPRINTERCURVES_R, -HAPPYPRINTERCURVES_R), HAPPYPRINTERCURVES_R, 90, 90)
            Line((0, -HAPPYPRINTERCURVES_R), (0, 0))
            Line((0, 0), (HAPPYPRINTERCURVES_R, 0))
        make_face()
    extrude(amount=53.79999999999958, mode=Mode.SUBTRACT)

    # Sketch6 → BasePlate (add)
    with BuildSketch(Plane.XZ.offset(22.64999999999993)):
        with Locations((-0.09860427356243306, -19.12509058636308)):
            Rectangle(SKETCH6_W, SKETCH6_H)
    extrude(amount=-BASEPLATE_DEPTH)

    # Sketch7 → SupportTorsionButBreathe (cut, through all)
    with BuildSketch(Plane(origin=(3.5542e-13, -21.449999999999932, 0), x_dir=(1, 1.657e-14, 0), z_dir=(-1.657e-14, 1, 0))):
        with BuildLine():
            Line((21.75000000000003, 36.768384756600554), (21.74999999999979, 26.401553875860724))
            ThreePointArc((21.74999999999979, 26.401553875860724), (-4e-15, 4.651553875860934), (-21.74999999999979, 26.401553875860724))
            Line((-21.74999999999979, 26.401553875860724), (-21.750000000000107, 36.76838475660055))
            Line((-21.750000000000107, 36.76838475660055), (-21.750000000000114, 38))
            ThreePointArc((-21.750000000000114, 38), (-22.335786437627018, 39.41421356237322), (-23.750000000000167, 40))
            Line((-23.750000000000167, 40), (-23.750000000000167, 46.1872525671472))
            Line((-23.750000000000167, 46.1872525671472), (23.749999999999964, 46.1872525671472))
            Line((23.749999999999964, 46.1872525671472), (23.749999999999964, 40))
            ThreePointArc((23.749999999999964, 40), (22.33578643762671, 39.414213562373185), (21.75000000000002, 38))
            Line((21.75000000000002, 38), (21.75000000000003, 36.768384756600554))
        make_face()
    extrude(amount=-SUPPORTTORSIONBUTBREATHE_DEPTH, mode=Mode.SUBTRACT)


solid = part.part
